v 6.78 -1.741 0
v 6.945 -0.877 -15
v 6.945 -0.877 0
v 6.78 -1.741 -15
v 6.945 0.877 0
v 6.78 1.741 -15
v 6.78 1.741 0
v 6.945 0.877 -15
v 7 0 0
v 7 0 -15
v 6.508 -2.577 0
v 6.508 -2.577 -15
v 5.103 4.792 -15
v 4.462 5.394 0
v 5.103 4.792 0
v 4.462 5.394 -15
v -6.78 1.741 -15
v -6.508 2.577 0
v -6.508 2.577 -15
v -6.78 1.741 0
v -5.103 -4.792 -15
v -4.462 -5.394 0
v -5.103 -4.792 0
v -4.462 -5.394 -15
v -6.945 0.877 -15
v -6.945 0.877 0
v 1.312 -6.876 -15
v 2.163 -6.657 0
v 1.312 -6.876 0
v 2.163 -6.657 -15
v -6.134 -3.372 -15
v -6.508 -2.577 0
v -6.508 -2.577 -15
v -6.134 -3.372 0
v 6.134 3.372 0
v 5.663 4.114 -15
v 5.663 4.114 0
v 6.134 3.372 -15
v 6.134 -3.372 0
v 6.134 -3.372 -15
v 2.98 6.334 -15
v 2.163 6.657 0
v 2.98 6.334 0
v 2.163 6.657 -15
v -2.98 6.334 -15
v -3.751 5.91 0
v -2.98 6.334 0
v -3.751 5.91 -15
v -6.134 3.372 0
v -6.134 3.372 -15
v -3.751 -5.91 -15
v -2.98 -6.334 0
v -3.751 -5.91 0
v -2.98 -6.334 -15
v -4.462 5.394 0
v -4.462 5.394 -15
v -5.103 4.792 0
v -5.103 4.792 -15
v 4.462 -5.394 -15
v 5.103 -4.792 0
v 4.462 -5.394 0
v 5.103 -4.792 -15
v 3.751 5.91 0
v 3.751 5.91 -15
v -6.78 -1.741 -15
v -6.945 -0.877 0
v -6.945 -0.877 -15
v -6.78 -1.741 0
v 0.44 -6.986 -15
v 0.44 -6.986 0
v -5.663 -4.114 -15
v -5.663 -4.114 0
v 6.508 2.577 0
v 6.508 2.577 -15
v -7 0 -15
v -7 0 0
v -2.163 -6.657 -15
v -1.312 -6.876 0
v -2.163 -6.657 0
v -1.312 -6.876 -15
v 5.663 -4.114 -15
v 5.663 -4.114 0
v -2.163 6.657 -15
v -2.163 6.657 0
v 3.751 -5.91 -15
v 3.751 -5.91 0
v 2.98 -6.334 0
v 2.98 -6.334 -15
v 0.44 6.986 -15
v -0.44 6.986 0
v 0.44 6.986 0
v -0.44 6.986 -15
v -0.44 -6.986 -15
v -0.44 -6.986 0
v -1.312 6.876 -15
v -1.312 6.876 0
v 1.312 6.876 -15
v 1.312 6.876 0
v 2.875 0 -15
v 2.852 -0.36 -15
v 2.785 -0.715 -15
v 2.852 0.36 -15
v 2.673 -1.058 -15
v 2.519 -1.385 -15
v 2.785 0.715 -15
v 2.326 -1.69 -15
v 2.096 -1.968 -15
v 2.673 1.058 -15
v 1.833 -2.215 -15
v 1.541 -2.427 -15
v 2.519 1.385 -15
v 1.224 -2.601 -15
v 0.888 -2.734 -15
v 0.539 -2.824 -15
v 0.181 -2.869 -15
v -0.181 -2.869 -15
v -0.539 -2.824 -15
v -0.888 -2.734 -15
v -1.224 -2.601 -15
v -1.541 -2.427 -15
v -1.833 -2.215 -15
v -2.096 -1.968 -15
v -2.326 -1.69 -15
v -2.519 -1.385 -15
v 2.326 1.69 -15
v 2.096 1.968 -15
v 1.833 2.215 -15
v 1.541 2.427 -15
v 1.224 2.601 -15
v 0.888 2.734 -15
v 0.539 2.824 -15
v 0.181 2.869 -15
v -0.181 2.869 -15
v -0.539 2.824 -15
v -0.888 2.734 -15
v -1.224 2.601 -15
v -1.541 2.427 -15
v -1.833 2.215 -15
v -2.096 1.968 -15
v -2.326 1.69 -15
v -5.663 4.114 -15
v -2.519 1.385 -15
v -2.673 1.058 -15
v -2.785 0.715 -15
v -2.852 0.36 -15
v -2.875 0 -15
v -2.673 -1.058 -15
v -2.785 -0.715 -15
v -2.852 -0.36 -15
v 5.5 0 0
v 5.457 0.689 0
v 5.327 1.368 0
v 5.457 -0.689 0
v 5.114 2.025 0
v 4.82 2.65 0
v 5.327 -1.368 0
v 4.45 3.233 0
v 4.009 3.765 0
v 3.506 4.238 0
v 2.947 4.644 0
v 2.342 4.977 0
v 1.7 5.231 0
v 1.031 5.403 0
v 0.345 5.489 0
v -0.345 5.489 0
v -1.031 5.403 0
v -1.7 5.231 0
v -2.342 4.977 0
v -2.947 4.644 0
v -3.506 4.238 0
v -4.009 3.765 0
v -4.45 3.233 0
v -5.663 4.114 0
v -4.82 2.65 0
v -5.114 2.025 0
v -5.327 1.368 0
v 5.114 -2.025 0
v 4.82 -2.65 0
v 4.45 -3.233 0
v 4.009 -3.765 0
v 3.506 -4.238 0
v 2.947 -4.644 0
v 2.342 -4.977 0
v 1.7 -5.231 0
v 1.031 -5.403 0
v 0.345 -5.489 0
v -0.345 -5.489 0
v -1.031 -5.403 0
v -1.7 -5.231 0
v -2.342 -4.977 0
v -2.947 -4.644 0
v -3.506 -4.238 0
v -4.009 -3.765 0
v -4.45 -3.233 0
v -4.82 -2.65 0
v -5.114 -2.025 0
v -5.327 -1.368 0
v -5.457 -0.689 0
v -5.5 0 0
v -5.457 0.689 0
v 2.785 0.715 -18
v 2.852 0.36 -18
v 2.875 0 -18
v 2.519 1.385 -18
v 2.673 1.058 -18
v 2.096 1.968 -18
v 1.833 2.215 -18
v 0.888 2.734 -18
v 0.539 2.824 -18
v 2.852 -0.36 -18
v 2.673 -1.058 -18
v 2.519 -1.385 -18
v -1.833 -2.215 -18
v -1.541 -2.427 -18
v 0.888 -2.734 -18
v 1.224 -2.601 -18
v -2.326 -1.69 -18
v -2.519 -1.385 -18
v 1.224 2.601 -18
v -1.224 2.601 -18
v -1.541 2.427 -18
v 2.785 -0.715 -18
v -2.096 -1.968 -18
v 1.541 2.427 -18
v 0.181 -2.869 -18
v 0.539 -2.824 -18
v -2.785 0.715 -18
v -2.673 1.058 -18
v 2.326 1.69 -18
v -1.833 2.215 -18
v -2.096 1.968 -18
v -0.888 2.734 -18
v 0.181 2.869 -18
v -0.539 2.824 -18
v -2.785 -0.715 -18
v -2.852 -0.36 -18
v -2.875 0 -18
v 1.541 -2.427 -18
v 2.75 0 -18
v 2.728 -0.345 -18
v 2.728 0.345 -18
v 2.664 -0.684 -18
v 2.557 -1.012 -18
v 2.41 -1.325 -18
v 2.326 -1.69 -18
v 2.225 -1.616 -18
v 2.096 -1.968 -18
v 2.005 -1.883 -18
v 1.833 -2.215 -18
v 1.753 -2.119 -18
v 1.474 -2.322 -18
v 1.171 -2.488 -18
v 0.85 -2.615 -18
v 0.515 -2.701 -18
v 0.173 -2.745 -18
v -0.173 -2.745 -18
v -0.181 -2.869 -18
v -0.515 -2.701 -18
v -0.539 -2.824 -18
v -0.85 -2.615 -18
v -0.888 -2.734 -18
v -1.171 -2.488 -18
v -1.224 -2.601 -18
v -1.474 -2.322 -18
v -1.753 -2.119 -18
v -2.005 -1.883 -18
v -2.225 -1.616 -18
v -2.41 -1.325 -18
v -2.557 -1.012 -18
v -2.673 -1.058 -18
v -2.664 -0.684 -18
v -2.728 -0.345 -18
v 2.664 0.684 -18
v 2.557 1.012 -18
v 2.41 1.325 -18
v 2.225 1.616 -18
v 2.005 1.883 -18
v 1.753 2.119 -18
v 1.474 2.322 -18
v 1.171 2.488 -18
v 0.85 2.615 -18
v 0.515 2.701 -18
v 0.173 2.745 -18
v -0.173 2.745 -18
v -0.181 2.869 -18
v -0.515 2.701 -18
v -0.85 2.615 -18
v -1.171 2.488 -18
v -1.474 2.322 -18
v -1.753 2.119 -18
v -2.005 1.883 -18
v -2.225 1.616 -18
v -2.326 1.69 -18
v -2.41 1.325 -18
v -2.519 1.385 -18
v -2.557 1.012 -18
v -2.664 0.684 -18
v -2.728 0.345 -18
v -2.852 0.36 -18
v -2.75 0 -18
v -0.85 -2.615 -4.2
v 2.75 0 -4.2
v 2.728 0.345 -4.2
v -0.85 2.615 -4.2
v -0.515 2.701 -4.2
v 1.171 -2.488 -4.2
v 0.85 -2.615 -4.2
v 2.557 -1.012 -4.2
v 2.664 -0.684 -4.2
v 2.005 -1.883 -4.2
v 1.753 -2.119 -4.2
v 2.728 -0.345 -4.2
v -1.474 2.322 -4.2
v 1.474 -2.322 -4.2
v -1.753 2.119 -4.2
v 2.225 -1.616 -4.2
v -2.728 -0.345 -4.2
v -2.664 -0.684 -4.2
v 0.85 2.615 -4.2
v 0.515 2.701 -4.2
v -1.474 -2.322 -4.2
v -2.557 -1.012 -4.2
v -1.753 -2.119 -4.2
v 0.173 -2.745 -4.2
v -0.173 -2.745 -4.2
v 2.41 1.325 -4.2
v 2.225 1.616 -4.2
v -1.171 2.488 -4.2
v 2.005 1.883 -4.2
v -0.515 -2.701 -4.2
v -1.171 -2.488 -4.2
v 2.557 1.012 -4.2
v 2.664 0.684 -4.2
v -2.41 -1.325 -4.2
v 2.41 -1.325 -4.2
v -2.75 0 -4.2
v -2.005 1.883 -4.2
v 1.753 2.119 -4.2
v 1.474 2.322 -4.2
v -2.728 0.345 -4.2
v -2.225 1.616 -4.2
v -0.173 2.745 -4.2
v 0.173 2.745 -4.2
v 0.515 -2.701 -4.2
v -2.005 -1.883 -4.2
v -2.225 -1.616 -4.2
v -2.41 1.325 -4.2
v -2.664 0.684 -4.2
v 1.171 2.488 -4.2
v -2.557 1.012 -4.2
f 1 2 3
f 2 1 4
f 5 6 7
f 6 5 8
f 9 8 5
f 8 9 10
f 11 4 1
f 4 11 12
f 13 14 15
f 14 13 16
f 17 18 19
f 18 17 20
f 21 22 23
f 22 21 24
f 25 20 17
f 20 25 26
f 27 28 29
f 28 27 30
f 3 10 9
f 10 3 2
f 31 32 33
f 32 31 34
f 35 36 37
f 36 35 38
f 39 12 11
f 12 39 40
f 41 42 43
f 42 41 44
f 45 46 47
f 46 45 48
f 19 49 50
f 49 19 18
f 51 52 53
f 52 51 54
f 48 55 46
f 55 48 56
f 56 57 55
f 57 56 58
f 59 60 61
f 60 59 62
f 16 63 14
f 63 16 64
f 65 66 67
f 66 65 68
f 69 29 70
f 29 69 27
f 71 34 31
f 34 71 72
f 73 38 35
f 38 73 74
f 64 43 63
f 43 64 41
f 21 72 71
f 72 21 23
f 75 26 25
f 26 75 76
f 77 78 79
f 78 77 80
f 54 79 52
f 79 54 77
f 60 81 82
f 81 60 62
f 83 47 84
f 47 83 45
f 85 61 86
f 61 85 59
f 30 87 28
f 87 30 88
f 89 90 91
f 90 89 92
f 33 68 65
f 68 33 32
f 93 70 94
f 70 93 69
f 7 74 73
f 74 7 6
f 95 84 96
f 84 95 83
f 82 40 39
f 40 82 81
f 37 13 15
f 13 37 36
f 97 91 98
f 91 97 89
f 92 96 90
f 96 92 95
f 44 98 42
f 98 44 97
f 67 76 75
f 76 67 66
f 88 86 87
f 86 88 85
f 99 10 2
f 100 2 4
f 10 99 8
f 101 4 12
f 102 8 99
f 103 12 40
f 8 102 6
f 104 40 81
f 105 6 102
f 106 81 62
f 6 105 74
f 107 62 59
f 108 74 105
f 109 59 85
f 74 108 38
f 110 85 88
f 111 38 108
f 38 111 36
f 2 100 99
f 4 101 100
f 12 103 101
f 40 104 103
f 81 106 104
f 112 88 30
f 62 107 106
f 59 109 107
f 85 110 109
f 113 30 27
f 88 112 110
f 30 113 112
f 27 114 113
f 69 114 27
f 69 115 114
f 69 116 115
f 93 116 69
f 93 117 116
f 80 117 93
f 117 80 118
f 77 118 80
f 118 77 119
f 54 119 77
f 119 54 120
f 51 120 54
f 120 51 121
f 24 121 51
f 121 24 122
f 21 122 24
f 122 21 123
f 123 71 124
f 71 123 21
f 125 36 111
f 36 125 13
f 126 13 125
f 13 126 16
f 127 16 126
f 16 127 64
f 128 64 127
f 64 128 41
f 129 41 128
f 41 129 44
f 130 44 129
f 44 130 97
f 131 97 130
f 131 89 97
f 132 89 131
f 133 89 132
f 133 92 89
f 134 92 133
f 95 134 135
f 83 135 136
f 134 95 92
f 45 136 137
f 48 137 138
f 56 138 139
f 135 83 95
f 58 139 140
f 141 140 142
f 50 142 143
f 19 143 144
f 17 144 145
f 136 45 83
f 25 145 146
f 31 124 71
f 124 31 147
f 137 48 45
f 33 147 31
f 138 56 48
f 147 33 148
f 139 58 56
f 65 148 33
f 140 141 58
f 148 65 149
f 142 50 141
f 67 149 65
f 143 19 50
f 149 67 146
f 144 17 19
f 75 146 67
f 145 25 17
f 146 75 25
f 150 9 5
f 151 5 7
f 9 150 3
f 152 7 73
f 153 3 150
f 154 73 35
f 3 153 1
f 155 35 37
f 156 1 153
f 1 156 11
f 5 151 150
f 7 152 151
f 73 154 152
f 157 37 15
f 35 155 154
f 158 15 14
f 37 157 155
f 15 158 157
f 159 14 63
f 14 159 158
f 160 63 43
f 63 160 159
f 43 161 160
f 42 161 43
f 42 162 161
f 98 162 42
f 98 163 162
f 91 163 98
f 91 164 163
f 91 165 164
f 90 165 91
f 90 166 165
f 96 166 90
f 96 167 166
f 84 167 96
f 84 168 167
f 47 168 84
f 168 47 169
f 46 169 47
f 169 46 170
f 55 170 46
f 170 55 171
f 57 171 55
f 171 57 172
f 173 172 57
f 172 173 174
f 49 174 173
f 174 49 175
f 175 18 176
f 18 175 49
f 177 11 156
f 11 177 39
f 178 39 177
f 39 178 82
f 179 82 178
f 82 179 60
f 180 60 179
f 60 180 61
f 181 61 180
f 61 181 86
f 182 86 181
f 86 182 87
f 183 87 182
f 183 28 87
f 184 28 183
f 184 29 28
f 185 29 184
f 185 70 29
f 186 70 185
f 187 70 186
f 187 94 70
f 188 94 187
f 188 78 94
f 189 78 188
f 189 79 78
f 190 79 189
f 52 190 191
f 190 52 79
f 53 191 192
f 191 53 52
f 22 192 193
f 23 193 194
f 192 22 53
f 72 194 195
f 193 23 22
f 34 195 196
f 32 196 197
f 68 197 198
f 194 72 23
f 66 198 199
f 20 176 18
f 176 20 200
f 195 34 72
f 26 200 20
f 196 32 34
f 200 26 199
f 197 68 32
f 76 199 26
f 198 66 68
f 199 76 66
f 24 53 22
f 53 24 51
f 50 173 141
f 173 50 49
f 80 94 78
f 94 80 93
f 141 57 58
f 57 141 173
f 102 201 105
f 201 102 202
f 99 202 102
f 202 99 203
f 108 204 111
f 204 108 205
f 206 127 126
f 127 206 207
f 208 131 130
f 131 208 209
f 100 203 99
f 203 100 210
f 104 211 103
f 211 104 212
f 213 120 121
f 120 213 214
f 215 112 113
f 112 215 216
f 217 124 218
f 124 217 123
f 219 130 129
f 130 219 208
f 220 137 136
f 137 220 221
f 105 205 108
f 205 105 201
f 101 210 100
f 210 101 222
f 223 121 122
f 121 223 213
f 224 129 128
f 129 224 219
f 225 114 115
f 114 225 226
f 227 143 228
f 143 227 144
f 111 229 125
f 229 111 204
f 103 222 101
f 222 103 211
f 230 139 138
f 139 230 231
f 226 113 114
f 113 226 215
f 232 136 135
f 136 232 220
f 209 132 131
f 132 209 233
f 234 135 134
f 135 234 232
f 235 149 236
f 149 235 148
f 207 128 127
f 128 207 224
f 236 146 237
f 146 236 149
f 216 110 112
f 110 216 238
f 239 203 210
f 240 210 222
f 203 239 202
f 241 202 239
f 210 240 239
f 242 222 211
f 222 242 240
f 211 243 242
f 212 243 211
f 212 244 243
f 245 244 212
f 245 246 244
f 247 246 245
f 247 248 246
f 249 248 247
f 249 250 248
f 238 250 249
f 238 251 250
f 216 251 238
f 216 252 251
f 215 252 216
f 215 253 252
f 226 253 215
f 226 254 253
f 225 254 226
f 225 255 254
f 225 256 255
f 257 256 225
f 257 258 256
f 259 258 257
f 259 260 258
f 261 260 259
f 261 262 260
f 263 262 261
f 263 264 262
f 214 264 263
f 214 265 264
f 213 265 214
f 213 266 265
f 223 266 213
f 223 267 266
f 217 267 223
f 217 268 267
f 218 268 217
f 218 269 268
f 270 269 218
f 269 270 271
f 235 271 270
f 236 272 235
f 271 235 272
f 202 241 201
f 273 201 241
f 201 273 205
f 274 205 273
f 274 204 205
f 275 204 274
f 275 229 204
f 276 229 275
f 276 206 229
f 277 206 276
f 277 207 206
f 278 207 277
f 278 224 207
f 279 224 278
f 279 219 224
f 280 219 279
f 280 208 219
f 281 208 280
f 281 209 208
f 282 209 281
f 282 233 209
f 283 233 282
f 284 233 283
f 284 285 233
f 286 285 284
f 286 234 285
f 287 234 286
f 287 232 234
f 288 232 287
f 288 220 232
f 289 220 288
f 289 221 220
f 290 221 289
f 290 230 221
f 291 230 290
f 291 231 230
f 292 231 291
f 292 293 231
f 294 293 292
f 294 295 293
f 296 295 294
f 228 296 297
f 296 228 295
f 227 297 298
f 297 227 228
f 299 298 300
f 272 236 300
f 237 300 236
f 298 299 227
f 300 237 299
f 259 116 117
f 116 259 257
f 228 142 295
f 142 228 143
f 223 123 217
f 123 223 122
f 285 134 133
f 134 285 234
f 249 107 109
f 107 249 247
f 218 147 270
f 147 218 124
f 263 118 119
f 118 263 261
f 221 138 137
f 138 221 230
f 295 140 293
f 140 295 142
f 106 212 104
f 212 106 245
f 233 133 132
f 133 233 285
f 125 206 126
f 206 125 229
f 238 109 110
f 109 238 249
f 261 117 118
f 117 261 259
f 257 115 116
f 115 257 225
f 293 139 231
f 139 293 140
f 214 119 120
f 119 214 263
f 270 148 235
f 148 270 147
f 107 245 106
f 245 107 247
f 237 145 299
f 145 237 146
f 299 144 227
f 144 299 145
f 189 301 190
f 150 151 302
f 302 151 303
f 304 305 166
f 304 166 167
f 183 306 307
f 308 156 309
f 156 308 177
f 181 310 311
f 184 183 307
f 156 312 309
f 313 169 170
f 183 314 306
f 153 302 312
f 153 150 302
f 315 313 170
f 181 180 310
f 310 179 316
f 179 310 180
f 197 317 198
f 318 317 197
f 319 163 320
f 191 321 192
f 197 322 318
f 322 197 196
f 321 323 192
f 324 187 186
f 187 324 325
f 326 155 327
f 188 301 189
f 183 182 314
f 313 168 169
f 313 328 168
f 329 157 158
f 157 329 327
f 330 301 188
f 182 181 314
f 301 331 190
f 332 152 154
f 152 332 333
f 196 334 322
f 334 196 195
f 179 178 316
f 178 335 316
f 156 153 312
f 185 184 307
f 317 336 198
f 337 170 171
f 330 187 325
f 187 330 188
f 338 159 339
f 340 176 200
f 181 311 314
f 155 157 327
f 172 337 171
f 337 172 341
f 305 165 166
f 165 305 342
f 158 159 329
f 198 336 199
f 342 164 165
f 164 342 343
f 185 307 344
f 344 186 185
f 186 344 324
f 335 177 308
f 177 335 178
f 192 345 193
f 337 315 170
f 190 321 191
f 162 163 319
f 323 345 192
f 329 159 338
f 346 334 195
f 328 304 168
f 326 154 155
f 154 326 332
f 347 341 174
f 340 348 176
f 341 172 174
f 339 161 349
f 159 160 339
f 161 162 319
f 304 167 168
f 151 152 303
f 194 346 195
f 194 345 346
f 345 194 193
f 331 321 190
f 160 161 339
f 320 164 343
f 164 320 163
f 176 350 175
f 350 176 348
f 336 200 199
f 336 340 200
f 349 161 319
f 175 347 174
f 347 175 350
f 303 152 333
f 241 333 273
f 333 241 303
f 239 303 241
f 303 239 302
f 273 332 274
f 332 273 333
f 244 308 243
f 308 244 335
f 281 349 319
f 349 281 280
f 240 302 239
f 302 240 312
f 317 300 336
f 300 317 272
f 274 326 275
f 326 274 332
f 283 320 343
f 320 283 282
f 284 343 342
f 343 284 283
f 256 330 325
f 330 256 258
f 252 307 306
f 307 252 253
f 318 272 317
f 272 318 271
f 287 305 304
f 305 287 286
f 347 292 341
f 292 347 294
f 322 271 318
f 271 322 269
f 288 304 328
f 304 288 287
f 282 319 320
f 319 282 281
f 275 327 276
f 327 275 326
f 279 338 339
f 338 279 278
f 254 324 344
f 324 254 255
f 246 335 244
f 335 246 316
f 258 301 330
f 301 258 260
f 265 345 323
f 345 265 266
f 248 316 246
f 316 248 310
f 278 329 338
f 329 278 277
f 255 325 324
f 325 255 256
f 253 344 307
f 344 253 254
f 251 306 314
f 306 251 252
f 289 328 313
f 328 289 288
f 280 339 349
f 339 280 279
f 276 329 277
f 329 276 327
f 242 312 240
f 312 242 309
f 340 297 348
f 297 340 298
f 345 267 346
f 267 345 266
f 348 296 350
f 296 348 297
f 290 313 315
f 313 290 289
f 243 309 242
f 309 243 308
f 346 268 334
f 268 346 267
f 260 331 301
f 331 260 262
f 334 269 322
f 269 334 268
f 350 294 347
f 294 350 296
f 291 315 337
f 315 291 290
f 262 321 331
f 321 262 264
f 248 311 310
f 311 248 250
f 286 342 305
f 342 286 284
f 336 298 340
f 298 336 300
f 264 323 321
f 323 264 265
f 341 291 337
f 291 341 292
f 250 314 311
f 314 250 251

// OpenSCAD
$fn = 50;

difference() {
	union() {
		translate(v = [0, 0, -15.0]) {
			cylinder(h = 15, r = 7.0);
		}
		#translate(v = [0, 0, -18.0]) {
			cylinder(h = 18, r = 2.875);
		}
	}
	union() {
		translate(v = [0, 0, 0]) {
			rotate(a = [0, 0, 0]) {
				difference() {
					union() {
						translate(v = [0, 0, -18.0]) {
							cylinder(h = 18, r = 2.25);
						}
						translate(v = [0, 0, -4.2]) {
							cylinder(h = 4.2, r1 = 2.75, r2 = 5.5);
						}
						translate(v = [0, 0, -18.0]) {
							cylinder(h = 18, r = 2.75);
						}
						translate(v = [0, 0, -18.0]) {
							cylinder(h = 18, r = 2.25);
						}
					}
					union();
				}
			}
		}
	}
}
